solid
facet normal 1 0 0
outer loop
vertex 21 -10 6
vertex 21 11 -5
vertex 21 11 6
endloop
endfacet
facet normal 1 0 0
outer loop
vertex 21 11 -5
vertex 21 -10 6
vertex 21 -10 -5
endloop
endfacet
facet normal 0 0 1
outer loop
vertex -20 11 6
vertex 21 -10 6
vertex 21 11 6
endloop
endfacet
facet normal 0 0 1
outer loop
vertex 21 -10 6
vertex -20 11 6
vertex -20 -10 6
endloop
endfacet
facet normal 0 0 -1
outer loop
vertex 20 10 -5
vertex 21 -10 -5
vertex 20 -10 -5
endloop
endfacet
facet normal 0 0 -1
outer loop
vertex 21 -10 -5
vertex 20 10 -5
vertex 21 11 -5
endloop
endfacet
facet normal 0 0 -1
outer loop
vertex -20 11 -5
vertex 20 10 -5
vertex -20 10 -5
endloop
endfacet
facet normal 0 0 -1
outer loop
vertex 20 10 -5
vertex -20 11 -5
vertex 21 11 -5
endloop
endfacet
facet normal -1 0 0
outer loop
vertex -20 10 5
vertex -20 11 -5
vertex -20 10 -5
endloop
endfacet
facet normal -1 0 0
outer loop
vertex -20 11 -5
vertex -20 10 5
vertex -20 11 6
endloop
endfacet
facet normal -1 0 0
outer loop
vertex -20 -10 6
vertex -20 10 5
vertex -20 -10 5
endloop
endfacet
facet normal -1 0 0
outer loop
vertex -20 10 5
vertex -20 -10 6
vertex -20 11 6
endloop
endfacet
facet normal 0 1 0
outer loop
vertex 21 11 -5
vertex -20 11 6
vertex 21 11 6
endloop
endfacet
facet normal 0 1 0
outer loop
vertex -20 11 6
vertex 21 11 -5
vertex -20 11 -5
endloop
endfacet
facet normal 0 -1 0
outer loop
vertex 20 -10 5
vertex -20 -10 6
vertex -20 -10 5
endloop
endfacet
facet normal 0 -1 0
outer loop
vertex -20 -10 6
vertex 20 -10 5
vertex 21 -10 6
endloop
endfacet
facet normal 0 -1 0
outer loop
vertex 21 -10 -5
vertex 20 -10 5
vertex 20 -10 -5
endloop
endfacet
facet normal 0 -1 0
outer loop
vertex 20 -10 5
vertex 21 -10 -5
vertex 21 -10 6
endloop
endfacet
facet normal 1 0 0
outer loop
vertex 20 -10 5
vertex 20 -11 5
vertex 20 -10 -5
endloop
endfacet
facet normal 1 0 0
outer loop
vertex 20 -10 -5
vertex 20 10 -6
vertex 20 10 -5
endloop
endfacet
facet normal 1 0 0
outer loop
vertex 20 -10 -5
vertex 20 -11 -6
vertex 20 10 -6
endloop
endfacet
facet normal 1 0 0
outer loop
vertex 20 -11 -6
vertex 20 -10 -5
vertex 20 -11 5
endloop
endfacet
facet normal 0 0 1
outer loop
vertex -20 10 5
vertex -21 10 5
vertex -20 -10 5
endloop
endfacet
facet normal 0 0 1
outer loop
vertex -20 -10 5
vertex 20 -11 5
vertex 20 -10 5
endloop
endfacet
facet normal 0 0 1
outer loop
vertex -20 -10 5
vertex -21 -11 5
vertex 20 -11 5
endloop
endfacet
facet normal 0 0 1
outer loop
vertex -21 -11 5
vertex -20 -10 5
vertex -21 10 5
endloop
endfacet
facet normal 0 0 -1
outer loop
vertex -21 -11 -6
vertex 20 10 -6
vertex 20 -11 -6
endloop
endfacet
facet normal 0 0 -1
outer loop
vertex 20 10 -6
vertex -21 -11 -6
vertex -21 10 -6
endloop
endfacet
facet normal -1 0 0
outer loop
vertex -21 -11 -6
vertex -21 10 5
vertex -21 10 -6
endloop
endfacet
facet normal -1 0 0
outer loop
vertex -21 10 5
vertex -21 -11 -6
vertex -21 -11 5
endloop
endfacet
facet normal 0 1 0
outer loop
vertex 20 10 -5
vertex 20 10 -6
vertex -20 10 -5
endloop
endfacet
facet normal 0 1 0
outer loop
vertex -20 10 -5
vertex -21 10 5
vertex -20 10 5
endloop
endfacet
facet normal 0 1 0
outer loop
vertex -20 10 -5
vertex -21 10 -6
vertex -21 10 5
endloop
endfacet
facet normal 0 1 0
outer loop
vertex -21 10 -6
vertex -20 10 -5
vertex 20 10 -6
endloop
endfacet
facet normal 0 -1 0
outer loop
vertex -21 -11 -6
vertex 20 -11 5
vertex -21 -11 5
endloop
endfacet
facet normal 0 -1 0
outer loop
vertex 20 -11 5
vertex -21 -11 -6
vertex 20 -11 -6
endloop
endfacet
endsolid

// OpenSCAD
// Unit of length: Unit.MM
union()
{
   color(c = [1.0, 0.0, 0.0, 1.0])
   {
      translate(v = [0.5, 0.5, 0.5])
      {
         cube(size = [41.0, 21.0, 11.0], center = true);
      }
   }
   translate(v = [-0.5, -0.5, -0.5])
   {
      cube(size = [41.0, 21.0, 11.0], center = true);
   }
}
